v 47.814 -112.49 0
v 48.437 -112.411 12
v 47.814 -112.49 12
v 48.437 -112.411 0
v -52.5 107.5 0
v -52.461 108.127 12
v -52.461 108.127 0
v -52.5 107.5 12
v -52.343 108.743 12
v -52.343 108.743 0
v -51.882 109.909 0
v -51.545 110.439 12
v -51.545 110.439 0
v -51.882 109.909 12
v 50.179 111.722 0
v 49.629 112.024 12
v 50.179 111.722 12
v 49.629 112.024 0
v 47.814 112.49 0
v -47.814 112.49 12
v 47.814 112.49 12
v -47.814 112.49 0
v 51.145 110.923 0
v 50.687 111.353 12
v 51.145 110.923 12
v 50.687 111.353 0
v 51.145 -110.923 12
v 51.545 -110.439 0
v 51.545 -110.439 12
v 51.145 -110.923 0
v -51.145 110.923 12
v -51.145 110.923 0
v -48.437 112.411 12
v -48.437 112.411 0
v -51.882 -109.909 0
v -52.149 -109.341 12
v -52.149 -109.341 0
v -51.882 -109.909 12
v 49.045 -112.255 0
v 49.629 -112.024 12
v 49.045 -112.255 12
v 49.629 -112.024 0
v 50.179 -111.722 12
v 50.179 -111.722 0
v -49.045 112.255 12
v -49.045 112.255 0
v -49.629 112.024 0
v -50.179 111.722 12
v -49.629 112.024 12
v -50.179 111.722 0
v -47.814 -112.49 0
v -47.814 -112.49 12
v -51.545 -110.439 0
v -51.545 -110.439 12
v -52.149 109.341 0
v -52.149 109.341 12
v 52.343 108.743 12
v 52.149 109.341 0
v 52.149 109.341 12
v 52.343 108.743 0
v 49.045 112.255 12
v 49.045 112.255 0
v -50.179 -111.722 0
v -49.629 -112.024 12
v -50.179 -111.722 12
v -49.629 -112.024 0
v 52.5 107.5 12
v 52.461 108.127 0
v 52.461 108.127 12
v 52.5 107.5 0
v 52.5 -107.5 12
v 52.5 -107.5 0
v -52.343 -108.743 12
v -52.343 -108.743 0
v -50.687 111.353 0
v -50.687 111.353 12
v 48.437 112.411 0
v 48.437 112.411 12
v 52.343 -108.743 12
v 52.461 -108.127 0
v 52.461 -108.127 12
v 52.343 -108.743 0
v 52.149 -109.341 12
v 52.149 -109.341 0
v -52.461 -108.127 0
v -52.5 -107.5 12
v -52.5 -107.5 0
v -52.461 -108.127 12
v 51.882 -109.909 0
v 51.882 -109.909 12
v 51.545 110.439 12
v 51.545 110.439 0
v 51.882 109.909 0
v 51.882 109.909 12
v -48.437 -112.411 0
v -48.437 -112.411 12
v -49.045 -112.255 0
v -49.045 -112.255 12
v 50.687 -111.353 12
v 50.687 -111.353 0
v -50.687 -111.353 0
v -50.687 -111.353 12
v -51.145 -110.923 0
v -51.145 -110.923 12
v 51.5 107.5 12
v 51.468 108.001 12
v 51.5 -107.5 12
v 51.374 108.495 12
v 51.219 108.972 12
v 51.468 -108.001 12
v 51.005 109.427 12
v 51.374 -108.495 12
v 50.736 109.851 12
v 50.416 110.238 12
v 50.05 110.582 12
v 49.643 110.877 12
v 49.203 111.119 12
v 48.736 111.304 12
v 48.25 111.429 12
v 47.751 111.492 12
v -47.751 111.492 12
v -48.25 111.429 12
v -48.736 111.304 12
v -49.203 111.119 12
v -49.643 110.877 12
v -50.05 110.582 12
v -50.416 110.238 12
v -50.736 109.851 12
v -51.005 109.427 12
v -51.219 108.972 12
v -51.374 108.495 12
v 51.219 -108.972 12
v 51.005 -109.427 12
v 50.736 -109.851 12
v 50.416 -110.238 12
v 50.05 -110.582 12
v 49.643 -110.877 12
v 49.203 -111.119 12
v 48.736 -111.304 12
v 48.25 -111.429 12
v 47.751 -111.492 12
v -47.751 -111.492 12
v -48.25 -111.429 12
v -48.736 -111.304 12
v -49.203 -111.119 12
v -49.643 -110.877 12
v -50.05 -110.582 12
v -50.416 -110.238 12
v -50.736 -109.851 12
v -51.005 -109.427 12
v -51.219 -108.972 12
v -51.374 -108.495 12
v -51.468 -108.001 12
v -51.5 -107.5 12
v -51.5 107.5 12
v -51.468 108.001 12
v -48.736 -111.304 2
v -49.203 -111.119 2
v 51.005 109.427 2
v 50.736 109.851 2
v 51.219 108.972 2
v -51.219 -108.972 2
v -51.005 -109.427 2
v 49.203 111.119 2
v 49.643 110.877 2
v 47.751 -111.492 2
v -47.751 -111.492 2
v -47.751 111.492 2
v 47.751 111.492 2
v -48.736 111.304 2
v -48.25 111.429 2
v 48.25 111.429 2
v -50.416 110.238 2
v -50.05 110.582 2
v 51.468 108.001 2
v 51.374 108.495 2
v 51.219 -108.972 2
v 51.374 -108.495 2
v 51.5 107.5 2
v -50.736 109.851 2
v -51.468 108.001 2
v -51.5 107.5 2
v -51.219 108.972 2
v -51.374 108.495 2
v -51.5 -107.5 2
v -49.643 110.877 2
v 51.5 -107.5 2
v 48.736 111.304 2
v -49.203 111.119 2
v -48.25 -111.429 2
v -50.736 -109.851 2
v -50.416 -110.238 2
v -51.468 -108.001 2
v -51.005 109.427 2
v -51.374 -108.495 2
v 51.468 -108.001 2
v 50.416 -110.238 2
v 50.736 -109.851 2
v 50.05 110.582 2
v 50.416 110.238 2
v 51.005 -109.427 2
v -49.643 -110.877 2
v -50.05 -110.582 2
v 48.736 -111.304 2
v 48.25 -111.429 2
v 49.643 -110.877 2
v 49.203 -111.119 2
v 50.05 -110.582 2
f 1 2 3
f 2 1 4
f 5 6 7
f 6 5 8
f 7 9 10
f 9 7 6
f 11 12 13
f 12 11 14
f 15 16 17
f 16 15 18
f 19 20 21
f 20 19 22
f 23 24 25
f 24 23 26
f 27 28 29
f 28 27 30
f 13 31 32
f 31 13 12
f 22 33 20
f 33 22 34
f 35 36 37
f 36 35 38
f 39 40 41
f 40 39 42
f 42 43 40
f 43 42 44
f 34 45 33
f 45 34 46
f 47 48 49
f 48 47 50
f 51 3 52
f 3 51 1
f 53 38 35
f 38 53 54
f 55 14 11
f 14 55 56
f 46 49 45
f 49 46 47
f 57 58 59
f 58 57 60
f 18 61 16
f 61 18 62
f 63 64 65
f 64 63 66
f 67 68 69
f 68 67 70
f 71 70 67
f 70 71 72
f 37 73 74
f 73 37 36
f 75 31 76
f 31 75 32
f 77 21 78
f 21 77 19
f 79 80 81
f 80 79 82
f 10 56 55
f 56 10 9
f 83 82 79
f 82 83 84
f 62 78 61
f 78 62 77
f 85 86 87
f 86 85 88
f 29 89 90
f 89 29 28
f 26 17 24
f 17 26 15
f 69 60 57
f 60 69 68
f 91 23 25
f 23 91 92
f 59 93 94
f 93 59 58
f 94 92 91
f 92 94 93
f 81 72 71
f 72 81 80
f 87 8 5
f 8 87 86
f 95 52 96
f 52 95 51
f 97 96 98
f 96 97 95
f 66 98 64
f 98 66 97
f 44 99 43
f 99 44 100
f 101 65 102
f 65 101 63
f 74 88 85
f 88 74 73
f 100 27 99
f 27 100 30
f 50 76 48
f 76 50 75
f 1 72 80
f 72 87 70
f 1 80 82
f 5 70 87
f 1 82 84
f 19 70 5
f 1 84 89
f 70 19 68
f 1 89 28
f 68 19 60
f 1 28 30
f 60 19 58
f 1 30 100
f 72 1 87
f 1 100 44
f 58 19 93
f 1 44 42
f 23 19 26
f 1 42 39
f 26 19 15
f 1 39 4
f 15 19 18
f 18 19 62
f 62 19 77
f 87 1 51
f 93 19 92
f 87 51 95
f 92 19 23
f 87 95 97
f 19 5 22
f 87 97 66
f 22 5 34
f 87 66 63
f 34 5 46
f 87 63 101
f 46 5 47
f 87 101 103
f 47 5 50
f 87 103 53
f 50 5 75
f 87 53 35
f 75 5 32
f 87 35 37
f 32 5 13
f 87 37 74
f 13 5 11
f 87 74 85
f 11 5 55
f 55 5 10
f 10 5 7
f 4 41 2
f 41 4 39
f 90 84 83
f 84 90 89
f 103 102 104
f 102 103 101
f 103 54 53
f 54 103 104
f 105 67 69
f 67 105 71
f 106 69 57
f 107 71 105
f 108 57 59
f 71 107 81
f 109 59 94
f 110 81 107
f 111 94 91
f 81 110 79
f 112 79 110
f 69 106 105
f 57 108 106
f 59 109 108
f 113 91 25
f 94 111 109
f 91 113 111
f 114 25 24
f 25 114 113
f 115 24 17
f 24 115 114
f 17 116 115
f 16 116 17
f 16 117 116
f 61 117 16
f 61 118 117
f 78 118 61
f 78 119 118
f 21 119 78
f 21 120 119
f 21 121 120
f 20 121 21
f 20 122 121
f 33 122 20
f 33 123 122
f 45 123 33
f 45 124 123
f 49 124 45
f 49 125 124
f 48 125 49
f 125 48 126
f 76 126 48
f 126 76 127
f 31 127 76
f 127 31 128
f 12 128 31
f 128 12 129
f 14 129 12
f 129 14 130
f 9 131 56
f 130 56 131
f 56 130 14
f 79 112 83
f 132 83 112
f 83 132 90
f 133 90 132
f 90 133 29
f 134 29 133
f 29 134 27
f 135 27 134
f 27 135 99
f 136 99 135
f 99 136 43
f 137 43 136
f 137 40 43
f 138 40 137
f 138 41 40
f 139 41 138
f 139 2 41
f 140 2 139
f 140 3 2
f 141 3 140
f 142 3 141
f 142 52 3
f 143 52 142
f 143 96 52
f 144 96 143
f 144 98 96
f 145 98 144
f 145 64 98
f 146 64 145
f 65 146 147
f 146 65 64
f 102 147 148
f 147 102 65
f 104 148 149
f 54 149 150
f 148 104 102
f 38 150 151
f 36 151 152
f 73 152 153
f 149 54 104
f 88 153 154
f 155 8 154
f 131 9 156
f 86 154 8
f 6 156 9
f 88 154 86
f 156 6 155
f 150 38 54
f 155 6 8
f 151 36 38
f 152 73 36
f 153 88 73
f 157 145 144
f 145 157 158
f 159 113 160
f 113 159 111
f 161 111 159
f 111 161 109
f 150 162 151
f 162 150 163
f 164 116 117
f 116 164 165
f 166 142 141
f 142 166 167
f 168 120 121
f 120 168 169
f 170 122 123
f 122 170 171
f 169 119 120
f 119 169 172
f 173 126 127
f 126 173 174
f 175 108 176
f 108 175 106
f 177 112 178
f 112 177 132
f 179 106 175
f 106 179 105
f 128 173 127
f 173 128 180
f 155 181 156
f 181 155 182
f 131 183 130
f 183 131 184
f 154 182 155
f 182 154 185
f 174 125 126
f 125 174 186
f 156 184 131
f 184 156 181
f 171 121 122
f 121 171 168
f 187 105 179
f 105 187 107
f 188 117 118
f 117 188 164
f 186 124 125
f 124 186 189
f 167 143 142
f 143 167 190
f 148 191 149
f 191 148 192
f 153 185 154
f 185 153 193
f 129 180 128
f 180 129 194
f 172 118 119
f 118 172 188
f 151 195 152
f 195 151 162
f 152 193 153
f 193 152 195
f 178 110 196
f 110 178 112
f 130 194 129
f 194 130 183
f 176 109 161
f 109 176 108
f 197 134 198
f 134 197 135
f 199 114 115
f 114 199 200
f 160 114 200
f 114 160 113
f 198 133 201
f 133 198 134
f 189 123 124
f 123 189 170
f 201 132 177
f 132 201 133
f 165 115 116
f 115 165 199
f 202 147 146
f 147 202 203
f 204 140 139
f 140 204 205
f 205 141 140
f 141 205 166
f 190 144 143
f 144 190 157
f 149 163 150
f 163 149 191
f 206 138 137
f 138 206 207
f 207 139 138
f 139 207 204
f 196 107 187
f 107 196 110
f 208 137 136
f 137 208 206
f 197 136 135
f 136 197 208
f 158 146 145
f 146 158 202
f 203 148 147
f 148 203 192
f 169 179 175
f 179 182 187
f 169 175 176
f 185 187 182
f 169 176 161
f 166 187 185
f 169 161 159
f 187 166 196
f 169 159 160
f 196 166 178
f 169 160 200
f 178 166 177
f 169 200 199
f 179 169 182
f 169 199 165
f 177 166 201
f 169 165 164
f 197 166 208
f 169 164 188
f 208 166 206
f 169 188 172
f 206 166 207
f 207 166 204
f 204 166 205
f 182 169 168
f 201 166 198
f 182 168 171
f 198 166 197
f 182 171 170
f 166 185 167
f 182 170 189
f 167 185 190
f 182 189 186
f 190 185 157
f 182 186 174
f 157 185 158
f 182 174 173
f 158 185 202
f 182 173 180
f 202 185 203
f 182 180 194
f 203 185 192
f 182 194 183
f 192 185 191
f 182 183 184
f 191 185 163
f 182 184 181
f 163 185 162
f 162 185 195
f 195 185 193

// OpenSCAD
$fn = 50;


difference() {
	union() {
		hull() {
			translate(v = [-47.5000000000, 107.5000000000, 0]) {
				cylinder(h = 12, r = 5);
			}
			translate(v = [47.5000000000, 107.5000000000, 0]) {
				cylinder(h = 12, r = 5);
			}
			translate(v = [-47.5000000000, -107.5000000000, 0]) {
				cylinder(h = 12, r = 5);
			}
			translate(v = [47.5000000000, -107.5000000000, 0]) {
				cylinder(h = 12, r = 5);
			}
		}
	}
	union() {
		translate(v = [0, 0, 2]) {
			hull() {
				translate(v = [-47.5000000000, 107.5000000000, 0]) {
					cylinder(h = 10, r = 4);
				}
				translate(v = [47.5000000000, 107.5000000000, 0]) {
					cylinder(h = 10, r = 4);
				}
				translate(v = [-47.5000000000, -107.5000000000, 0]) {
					cylinder(h = 10, r = 4);
				}
				translate(v = [47.5000000000, -107.5000000000, 0]) {
					cylinder(h = 10, r = 4);
				}
			}
		}
	}
}
